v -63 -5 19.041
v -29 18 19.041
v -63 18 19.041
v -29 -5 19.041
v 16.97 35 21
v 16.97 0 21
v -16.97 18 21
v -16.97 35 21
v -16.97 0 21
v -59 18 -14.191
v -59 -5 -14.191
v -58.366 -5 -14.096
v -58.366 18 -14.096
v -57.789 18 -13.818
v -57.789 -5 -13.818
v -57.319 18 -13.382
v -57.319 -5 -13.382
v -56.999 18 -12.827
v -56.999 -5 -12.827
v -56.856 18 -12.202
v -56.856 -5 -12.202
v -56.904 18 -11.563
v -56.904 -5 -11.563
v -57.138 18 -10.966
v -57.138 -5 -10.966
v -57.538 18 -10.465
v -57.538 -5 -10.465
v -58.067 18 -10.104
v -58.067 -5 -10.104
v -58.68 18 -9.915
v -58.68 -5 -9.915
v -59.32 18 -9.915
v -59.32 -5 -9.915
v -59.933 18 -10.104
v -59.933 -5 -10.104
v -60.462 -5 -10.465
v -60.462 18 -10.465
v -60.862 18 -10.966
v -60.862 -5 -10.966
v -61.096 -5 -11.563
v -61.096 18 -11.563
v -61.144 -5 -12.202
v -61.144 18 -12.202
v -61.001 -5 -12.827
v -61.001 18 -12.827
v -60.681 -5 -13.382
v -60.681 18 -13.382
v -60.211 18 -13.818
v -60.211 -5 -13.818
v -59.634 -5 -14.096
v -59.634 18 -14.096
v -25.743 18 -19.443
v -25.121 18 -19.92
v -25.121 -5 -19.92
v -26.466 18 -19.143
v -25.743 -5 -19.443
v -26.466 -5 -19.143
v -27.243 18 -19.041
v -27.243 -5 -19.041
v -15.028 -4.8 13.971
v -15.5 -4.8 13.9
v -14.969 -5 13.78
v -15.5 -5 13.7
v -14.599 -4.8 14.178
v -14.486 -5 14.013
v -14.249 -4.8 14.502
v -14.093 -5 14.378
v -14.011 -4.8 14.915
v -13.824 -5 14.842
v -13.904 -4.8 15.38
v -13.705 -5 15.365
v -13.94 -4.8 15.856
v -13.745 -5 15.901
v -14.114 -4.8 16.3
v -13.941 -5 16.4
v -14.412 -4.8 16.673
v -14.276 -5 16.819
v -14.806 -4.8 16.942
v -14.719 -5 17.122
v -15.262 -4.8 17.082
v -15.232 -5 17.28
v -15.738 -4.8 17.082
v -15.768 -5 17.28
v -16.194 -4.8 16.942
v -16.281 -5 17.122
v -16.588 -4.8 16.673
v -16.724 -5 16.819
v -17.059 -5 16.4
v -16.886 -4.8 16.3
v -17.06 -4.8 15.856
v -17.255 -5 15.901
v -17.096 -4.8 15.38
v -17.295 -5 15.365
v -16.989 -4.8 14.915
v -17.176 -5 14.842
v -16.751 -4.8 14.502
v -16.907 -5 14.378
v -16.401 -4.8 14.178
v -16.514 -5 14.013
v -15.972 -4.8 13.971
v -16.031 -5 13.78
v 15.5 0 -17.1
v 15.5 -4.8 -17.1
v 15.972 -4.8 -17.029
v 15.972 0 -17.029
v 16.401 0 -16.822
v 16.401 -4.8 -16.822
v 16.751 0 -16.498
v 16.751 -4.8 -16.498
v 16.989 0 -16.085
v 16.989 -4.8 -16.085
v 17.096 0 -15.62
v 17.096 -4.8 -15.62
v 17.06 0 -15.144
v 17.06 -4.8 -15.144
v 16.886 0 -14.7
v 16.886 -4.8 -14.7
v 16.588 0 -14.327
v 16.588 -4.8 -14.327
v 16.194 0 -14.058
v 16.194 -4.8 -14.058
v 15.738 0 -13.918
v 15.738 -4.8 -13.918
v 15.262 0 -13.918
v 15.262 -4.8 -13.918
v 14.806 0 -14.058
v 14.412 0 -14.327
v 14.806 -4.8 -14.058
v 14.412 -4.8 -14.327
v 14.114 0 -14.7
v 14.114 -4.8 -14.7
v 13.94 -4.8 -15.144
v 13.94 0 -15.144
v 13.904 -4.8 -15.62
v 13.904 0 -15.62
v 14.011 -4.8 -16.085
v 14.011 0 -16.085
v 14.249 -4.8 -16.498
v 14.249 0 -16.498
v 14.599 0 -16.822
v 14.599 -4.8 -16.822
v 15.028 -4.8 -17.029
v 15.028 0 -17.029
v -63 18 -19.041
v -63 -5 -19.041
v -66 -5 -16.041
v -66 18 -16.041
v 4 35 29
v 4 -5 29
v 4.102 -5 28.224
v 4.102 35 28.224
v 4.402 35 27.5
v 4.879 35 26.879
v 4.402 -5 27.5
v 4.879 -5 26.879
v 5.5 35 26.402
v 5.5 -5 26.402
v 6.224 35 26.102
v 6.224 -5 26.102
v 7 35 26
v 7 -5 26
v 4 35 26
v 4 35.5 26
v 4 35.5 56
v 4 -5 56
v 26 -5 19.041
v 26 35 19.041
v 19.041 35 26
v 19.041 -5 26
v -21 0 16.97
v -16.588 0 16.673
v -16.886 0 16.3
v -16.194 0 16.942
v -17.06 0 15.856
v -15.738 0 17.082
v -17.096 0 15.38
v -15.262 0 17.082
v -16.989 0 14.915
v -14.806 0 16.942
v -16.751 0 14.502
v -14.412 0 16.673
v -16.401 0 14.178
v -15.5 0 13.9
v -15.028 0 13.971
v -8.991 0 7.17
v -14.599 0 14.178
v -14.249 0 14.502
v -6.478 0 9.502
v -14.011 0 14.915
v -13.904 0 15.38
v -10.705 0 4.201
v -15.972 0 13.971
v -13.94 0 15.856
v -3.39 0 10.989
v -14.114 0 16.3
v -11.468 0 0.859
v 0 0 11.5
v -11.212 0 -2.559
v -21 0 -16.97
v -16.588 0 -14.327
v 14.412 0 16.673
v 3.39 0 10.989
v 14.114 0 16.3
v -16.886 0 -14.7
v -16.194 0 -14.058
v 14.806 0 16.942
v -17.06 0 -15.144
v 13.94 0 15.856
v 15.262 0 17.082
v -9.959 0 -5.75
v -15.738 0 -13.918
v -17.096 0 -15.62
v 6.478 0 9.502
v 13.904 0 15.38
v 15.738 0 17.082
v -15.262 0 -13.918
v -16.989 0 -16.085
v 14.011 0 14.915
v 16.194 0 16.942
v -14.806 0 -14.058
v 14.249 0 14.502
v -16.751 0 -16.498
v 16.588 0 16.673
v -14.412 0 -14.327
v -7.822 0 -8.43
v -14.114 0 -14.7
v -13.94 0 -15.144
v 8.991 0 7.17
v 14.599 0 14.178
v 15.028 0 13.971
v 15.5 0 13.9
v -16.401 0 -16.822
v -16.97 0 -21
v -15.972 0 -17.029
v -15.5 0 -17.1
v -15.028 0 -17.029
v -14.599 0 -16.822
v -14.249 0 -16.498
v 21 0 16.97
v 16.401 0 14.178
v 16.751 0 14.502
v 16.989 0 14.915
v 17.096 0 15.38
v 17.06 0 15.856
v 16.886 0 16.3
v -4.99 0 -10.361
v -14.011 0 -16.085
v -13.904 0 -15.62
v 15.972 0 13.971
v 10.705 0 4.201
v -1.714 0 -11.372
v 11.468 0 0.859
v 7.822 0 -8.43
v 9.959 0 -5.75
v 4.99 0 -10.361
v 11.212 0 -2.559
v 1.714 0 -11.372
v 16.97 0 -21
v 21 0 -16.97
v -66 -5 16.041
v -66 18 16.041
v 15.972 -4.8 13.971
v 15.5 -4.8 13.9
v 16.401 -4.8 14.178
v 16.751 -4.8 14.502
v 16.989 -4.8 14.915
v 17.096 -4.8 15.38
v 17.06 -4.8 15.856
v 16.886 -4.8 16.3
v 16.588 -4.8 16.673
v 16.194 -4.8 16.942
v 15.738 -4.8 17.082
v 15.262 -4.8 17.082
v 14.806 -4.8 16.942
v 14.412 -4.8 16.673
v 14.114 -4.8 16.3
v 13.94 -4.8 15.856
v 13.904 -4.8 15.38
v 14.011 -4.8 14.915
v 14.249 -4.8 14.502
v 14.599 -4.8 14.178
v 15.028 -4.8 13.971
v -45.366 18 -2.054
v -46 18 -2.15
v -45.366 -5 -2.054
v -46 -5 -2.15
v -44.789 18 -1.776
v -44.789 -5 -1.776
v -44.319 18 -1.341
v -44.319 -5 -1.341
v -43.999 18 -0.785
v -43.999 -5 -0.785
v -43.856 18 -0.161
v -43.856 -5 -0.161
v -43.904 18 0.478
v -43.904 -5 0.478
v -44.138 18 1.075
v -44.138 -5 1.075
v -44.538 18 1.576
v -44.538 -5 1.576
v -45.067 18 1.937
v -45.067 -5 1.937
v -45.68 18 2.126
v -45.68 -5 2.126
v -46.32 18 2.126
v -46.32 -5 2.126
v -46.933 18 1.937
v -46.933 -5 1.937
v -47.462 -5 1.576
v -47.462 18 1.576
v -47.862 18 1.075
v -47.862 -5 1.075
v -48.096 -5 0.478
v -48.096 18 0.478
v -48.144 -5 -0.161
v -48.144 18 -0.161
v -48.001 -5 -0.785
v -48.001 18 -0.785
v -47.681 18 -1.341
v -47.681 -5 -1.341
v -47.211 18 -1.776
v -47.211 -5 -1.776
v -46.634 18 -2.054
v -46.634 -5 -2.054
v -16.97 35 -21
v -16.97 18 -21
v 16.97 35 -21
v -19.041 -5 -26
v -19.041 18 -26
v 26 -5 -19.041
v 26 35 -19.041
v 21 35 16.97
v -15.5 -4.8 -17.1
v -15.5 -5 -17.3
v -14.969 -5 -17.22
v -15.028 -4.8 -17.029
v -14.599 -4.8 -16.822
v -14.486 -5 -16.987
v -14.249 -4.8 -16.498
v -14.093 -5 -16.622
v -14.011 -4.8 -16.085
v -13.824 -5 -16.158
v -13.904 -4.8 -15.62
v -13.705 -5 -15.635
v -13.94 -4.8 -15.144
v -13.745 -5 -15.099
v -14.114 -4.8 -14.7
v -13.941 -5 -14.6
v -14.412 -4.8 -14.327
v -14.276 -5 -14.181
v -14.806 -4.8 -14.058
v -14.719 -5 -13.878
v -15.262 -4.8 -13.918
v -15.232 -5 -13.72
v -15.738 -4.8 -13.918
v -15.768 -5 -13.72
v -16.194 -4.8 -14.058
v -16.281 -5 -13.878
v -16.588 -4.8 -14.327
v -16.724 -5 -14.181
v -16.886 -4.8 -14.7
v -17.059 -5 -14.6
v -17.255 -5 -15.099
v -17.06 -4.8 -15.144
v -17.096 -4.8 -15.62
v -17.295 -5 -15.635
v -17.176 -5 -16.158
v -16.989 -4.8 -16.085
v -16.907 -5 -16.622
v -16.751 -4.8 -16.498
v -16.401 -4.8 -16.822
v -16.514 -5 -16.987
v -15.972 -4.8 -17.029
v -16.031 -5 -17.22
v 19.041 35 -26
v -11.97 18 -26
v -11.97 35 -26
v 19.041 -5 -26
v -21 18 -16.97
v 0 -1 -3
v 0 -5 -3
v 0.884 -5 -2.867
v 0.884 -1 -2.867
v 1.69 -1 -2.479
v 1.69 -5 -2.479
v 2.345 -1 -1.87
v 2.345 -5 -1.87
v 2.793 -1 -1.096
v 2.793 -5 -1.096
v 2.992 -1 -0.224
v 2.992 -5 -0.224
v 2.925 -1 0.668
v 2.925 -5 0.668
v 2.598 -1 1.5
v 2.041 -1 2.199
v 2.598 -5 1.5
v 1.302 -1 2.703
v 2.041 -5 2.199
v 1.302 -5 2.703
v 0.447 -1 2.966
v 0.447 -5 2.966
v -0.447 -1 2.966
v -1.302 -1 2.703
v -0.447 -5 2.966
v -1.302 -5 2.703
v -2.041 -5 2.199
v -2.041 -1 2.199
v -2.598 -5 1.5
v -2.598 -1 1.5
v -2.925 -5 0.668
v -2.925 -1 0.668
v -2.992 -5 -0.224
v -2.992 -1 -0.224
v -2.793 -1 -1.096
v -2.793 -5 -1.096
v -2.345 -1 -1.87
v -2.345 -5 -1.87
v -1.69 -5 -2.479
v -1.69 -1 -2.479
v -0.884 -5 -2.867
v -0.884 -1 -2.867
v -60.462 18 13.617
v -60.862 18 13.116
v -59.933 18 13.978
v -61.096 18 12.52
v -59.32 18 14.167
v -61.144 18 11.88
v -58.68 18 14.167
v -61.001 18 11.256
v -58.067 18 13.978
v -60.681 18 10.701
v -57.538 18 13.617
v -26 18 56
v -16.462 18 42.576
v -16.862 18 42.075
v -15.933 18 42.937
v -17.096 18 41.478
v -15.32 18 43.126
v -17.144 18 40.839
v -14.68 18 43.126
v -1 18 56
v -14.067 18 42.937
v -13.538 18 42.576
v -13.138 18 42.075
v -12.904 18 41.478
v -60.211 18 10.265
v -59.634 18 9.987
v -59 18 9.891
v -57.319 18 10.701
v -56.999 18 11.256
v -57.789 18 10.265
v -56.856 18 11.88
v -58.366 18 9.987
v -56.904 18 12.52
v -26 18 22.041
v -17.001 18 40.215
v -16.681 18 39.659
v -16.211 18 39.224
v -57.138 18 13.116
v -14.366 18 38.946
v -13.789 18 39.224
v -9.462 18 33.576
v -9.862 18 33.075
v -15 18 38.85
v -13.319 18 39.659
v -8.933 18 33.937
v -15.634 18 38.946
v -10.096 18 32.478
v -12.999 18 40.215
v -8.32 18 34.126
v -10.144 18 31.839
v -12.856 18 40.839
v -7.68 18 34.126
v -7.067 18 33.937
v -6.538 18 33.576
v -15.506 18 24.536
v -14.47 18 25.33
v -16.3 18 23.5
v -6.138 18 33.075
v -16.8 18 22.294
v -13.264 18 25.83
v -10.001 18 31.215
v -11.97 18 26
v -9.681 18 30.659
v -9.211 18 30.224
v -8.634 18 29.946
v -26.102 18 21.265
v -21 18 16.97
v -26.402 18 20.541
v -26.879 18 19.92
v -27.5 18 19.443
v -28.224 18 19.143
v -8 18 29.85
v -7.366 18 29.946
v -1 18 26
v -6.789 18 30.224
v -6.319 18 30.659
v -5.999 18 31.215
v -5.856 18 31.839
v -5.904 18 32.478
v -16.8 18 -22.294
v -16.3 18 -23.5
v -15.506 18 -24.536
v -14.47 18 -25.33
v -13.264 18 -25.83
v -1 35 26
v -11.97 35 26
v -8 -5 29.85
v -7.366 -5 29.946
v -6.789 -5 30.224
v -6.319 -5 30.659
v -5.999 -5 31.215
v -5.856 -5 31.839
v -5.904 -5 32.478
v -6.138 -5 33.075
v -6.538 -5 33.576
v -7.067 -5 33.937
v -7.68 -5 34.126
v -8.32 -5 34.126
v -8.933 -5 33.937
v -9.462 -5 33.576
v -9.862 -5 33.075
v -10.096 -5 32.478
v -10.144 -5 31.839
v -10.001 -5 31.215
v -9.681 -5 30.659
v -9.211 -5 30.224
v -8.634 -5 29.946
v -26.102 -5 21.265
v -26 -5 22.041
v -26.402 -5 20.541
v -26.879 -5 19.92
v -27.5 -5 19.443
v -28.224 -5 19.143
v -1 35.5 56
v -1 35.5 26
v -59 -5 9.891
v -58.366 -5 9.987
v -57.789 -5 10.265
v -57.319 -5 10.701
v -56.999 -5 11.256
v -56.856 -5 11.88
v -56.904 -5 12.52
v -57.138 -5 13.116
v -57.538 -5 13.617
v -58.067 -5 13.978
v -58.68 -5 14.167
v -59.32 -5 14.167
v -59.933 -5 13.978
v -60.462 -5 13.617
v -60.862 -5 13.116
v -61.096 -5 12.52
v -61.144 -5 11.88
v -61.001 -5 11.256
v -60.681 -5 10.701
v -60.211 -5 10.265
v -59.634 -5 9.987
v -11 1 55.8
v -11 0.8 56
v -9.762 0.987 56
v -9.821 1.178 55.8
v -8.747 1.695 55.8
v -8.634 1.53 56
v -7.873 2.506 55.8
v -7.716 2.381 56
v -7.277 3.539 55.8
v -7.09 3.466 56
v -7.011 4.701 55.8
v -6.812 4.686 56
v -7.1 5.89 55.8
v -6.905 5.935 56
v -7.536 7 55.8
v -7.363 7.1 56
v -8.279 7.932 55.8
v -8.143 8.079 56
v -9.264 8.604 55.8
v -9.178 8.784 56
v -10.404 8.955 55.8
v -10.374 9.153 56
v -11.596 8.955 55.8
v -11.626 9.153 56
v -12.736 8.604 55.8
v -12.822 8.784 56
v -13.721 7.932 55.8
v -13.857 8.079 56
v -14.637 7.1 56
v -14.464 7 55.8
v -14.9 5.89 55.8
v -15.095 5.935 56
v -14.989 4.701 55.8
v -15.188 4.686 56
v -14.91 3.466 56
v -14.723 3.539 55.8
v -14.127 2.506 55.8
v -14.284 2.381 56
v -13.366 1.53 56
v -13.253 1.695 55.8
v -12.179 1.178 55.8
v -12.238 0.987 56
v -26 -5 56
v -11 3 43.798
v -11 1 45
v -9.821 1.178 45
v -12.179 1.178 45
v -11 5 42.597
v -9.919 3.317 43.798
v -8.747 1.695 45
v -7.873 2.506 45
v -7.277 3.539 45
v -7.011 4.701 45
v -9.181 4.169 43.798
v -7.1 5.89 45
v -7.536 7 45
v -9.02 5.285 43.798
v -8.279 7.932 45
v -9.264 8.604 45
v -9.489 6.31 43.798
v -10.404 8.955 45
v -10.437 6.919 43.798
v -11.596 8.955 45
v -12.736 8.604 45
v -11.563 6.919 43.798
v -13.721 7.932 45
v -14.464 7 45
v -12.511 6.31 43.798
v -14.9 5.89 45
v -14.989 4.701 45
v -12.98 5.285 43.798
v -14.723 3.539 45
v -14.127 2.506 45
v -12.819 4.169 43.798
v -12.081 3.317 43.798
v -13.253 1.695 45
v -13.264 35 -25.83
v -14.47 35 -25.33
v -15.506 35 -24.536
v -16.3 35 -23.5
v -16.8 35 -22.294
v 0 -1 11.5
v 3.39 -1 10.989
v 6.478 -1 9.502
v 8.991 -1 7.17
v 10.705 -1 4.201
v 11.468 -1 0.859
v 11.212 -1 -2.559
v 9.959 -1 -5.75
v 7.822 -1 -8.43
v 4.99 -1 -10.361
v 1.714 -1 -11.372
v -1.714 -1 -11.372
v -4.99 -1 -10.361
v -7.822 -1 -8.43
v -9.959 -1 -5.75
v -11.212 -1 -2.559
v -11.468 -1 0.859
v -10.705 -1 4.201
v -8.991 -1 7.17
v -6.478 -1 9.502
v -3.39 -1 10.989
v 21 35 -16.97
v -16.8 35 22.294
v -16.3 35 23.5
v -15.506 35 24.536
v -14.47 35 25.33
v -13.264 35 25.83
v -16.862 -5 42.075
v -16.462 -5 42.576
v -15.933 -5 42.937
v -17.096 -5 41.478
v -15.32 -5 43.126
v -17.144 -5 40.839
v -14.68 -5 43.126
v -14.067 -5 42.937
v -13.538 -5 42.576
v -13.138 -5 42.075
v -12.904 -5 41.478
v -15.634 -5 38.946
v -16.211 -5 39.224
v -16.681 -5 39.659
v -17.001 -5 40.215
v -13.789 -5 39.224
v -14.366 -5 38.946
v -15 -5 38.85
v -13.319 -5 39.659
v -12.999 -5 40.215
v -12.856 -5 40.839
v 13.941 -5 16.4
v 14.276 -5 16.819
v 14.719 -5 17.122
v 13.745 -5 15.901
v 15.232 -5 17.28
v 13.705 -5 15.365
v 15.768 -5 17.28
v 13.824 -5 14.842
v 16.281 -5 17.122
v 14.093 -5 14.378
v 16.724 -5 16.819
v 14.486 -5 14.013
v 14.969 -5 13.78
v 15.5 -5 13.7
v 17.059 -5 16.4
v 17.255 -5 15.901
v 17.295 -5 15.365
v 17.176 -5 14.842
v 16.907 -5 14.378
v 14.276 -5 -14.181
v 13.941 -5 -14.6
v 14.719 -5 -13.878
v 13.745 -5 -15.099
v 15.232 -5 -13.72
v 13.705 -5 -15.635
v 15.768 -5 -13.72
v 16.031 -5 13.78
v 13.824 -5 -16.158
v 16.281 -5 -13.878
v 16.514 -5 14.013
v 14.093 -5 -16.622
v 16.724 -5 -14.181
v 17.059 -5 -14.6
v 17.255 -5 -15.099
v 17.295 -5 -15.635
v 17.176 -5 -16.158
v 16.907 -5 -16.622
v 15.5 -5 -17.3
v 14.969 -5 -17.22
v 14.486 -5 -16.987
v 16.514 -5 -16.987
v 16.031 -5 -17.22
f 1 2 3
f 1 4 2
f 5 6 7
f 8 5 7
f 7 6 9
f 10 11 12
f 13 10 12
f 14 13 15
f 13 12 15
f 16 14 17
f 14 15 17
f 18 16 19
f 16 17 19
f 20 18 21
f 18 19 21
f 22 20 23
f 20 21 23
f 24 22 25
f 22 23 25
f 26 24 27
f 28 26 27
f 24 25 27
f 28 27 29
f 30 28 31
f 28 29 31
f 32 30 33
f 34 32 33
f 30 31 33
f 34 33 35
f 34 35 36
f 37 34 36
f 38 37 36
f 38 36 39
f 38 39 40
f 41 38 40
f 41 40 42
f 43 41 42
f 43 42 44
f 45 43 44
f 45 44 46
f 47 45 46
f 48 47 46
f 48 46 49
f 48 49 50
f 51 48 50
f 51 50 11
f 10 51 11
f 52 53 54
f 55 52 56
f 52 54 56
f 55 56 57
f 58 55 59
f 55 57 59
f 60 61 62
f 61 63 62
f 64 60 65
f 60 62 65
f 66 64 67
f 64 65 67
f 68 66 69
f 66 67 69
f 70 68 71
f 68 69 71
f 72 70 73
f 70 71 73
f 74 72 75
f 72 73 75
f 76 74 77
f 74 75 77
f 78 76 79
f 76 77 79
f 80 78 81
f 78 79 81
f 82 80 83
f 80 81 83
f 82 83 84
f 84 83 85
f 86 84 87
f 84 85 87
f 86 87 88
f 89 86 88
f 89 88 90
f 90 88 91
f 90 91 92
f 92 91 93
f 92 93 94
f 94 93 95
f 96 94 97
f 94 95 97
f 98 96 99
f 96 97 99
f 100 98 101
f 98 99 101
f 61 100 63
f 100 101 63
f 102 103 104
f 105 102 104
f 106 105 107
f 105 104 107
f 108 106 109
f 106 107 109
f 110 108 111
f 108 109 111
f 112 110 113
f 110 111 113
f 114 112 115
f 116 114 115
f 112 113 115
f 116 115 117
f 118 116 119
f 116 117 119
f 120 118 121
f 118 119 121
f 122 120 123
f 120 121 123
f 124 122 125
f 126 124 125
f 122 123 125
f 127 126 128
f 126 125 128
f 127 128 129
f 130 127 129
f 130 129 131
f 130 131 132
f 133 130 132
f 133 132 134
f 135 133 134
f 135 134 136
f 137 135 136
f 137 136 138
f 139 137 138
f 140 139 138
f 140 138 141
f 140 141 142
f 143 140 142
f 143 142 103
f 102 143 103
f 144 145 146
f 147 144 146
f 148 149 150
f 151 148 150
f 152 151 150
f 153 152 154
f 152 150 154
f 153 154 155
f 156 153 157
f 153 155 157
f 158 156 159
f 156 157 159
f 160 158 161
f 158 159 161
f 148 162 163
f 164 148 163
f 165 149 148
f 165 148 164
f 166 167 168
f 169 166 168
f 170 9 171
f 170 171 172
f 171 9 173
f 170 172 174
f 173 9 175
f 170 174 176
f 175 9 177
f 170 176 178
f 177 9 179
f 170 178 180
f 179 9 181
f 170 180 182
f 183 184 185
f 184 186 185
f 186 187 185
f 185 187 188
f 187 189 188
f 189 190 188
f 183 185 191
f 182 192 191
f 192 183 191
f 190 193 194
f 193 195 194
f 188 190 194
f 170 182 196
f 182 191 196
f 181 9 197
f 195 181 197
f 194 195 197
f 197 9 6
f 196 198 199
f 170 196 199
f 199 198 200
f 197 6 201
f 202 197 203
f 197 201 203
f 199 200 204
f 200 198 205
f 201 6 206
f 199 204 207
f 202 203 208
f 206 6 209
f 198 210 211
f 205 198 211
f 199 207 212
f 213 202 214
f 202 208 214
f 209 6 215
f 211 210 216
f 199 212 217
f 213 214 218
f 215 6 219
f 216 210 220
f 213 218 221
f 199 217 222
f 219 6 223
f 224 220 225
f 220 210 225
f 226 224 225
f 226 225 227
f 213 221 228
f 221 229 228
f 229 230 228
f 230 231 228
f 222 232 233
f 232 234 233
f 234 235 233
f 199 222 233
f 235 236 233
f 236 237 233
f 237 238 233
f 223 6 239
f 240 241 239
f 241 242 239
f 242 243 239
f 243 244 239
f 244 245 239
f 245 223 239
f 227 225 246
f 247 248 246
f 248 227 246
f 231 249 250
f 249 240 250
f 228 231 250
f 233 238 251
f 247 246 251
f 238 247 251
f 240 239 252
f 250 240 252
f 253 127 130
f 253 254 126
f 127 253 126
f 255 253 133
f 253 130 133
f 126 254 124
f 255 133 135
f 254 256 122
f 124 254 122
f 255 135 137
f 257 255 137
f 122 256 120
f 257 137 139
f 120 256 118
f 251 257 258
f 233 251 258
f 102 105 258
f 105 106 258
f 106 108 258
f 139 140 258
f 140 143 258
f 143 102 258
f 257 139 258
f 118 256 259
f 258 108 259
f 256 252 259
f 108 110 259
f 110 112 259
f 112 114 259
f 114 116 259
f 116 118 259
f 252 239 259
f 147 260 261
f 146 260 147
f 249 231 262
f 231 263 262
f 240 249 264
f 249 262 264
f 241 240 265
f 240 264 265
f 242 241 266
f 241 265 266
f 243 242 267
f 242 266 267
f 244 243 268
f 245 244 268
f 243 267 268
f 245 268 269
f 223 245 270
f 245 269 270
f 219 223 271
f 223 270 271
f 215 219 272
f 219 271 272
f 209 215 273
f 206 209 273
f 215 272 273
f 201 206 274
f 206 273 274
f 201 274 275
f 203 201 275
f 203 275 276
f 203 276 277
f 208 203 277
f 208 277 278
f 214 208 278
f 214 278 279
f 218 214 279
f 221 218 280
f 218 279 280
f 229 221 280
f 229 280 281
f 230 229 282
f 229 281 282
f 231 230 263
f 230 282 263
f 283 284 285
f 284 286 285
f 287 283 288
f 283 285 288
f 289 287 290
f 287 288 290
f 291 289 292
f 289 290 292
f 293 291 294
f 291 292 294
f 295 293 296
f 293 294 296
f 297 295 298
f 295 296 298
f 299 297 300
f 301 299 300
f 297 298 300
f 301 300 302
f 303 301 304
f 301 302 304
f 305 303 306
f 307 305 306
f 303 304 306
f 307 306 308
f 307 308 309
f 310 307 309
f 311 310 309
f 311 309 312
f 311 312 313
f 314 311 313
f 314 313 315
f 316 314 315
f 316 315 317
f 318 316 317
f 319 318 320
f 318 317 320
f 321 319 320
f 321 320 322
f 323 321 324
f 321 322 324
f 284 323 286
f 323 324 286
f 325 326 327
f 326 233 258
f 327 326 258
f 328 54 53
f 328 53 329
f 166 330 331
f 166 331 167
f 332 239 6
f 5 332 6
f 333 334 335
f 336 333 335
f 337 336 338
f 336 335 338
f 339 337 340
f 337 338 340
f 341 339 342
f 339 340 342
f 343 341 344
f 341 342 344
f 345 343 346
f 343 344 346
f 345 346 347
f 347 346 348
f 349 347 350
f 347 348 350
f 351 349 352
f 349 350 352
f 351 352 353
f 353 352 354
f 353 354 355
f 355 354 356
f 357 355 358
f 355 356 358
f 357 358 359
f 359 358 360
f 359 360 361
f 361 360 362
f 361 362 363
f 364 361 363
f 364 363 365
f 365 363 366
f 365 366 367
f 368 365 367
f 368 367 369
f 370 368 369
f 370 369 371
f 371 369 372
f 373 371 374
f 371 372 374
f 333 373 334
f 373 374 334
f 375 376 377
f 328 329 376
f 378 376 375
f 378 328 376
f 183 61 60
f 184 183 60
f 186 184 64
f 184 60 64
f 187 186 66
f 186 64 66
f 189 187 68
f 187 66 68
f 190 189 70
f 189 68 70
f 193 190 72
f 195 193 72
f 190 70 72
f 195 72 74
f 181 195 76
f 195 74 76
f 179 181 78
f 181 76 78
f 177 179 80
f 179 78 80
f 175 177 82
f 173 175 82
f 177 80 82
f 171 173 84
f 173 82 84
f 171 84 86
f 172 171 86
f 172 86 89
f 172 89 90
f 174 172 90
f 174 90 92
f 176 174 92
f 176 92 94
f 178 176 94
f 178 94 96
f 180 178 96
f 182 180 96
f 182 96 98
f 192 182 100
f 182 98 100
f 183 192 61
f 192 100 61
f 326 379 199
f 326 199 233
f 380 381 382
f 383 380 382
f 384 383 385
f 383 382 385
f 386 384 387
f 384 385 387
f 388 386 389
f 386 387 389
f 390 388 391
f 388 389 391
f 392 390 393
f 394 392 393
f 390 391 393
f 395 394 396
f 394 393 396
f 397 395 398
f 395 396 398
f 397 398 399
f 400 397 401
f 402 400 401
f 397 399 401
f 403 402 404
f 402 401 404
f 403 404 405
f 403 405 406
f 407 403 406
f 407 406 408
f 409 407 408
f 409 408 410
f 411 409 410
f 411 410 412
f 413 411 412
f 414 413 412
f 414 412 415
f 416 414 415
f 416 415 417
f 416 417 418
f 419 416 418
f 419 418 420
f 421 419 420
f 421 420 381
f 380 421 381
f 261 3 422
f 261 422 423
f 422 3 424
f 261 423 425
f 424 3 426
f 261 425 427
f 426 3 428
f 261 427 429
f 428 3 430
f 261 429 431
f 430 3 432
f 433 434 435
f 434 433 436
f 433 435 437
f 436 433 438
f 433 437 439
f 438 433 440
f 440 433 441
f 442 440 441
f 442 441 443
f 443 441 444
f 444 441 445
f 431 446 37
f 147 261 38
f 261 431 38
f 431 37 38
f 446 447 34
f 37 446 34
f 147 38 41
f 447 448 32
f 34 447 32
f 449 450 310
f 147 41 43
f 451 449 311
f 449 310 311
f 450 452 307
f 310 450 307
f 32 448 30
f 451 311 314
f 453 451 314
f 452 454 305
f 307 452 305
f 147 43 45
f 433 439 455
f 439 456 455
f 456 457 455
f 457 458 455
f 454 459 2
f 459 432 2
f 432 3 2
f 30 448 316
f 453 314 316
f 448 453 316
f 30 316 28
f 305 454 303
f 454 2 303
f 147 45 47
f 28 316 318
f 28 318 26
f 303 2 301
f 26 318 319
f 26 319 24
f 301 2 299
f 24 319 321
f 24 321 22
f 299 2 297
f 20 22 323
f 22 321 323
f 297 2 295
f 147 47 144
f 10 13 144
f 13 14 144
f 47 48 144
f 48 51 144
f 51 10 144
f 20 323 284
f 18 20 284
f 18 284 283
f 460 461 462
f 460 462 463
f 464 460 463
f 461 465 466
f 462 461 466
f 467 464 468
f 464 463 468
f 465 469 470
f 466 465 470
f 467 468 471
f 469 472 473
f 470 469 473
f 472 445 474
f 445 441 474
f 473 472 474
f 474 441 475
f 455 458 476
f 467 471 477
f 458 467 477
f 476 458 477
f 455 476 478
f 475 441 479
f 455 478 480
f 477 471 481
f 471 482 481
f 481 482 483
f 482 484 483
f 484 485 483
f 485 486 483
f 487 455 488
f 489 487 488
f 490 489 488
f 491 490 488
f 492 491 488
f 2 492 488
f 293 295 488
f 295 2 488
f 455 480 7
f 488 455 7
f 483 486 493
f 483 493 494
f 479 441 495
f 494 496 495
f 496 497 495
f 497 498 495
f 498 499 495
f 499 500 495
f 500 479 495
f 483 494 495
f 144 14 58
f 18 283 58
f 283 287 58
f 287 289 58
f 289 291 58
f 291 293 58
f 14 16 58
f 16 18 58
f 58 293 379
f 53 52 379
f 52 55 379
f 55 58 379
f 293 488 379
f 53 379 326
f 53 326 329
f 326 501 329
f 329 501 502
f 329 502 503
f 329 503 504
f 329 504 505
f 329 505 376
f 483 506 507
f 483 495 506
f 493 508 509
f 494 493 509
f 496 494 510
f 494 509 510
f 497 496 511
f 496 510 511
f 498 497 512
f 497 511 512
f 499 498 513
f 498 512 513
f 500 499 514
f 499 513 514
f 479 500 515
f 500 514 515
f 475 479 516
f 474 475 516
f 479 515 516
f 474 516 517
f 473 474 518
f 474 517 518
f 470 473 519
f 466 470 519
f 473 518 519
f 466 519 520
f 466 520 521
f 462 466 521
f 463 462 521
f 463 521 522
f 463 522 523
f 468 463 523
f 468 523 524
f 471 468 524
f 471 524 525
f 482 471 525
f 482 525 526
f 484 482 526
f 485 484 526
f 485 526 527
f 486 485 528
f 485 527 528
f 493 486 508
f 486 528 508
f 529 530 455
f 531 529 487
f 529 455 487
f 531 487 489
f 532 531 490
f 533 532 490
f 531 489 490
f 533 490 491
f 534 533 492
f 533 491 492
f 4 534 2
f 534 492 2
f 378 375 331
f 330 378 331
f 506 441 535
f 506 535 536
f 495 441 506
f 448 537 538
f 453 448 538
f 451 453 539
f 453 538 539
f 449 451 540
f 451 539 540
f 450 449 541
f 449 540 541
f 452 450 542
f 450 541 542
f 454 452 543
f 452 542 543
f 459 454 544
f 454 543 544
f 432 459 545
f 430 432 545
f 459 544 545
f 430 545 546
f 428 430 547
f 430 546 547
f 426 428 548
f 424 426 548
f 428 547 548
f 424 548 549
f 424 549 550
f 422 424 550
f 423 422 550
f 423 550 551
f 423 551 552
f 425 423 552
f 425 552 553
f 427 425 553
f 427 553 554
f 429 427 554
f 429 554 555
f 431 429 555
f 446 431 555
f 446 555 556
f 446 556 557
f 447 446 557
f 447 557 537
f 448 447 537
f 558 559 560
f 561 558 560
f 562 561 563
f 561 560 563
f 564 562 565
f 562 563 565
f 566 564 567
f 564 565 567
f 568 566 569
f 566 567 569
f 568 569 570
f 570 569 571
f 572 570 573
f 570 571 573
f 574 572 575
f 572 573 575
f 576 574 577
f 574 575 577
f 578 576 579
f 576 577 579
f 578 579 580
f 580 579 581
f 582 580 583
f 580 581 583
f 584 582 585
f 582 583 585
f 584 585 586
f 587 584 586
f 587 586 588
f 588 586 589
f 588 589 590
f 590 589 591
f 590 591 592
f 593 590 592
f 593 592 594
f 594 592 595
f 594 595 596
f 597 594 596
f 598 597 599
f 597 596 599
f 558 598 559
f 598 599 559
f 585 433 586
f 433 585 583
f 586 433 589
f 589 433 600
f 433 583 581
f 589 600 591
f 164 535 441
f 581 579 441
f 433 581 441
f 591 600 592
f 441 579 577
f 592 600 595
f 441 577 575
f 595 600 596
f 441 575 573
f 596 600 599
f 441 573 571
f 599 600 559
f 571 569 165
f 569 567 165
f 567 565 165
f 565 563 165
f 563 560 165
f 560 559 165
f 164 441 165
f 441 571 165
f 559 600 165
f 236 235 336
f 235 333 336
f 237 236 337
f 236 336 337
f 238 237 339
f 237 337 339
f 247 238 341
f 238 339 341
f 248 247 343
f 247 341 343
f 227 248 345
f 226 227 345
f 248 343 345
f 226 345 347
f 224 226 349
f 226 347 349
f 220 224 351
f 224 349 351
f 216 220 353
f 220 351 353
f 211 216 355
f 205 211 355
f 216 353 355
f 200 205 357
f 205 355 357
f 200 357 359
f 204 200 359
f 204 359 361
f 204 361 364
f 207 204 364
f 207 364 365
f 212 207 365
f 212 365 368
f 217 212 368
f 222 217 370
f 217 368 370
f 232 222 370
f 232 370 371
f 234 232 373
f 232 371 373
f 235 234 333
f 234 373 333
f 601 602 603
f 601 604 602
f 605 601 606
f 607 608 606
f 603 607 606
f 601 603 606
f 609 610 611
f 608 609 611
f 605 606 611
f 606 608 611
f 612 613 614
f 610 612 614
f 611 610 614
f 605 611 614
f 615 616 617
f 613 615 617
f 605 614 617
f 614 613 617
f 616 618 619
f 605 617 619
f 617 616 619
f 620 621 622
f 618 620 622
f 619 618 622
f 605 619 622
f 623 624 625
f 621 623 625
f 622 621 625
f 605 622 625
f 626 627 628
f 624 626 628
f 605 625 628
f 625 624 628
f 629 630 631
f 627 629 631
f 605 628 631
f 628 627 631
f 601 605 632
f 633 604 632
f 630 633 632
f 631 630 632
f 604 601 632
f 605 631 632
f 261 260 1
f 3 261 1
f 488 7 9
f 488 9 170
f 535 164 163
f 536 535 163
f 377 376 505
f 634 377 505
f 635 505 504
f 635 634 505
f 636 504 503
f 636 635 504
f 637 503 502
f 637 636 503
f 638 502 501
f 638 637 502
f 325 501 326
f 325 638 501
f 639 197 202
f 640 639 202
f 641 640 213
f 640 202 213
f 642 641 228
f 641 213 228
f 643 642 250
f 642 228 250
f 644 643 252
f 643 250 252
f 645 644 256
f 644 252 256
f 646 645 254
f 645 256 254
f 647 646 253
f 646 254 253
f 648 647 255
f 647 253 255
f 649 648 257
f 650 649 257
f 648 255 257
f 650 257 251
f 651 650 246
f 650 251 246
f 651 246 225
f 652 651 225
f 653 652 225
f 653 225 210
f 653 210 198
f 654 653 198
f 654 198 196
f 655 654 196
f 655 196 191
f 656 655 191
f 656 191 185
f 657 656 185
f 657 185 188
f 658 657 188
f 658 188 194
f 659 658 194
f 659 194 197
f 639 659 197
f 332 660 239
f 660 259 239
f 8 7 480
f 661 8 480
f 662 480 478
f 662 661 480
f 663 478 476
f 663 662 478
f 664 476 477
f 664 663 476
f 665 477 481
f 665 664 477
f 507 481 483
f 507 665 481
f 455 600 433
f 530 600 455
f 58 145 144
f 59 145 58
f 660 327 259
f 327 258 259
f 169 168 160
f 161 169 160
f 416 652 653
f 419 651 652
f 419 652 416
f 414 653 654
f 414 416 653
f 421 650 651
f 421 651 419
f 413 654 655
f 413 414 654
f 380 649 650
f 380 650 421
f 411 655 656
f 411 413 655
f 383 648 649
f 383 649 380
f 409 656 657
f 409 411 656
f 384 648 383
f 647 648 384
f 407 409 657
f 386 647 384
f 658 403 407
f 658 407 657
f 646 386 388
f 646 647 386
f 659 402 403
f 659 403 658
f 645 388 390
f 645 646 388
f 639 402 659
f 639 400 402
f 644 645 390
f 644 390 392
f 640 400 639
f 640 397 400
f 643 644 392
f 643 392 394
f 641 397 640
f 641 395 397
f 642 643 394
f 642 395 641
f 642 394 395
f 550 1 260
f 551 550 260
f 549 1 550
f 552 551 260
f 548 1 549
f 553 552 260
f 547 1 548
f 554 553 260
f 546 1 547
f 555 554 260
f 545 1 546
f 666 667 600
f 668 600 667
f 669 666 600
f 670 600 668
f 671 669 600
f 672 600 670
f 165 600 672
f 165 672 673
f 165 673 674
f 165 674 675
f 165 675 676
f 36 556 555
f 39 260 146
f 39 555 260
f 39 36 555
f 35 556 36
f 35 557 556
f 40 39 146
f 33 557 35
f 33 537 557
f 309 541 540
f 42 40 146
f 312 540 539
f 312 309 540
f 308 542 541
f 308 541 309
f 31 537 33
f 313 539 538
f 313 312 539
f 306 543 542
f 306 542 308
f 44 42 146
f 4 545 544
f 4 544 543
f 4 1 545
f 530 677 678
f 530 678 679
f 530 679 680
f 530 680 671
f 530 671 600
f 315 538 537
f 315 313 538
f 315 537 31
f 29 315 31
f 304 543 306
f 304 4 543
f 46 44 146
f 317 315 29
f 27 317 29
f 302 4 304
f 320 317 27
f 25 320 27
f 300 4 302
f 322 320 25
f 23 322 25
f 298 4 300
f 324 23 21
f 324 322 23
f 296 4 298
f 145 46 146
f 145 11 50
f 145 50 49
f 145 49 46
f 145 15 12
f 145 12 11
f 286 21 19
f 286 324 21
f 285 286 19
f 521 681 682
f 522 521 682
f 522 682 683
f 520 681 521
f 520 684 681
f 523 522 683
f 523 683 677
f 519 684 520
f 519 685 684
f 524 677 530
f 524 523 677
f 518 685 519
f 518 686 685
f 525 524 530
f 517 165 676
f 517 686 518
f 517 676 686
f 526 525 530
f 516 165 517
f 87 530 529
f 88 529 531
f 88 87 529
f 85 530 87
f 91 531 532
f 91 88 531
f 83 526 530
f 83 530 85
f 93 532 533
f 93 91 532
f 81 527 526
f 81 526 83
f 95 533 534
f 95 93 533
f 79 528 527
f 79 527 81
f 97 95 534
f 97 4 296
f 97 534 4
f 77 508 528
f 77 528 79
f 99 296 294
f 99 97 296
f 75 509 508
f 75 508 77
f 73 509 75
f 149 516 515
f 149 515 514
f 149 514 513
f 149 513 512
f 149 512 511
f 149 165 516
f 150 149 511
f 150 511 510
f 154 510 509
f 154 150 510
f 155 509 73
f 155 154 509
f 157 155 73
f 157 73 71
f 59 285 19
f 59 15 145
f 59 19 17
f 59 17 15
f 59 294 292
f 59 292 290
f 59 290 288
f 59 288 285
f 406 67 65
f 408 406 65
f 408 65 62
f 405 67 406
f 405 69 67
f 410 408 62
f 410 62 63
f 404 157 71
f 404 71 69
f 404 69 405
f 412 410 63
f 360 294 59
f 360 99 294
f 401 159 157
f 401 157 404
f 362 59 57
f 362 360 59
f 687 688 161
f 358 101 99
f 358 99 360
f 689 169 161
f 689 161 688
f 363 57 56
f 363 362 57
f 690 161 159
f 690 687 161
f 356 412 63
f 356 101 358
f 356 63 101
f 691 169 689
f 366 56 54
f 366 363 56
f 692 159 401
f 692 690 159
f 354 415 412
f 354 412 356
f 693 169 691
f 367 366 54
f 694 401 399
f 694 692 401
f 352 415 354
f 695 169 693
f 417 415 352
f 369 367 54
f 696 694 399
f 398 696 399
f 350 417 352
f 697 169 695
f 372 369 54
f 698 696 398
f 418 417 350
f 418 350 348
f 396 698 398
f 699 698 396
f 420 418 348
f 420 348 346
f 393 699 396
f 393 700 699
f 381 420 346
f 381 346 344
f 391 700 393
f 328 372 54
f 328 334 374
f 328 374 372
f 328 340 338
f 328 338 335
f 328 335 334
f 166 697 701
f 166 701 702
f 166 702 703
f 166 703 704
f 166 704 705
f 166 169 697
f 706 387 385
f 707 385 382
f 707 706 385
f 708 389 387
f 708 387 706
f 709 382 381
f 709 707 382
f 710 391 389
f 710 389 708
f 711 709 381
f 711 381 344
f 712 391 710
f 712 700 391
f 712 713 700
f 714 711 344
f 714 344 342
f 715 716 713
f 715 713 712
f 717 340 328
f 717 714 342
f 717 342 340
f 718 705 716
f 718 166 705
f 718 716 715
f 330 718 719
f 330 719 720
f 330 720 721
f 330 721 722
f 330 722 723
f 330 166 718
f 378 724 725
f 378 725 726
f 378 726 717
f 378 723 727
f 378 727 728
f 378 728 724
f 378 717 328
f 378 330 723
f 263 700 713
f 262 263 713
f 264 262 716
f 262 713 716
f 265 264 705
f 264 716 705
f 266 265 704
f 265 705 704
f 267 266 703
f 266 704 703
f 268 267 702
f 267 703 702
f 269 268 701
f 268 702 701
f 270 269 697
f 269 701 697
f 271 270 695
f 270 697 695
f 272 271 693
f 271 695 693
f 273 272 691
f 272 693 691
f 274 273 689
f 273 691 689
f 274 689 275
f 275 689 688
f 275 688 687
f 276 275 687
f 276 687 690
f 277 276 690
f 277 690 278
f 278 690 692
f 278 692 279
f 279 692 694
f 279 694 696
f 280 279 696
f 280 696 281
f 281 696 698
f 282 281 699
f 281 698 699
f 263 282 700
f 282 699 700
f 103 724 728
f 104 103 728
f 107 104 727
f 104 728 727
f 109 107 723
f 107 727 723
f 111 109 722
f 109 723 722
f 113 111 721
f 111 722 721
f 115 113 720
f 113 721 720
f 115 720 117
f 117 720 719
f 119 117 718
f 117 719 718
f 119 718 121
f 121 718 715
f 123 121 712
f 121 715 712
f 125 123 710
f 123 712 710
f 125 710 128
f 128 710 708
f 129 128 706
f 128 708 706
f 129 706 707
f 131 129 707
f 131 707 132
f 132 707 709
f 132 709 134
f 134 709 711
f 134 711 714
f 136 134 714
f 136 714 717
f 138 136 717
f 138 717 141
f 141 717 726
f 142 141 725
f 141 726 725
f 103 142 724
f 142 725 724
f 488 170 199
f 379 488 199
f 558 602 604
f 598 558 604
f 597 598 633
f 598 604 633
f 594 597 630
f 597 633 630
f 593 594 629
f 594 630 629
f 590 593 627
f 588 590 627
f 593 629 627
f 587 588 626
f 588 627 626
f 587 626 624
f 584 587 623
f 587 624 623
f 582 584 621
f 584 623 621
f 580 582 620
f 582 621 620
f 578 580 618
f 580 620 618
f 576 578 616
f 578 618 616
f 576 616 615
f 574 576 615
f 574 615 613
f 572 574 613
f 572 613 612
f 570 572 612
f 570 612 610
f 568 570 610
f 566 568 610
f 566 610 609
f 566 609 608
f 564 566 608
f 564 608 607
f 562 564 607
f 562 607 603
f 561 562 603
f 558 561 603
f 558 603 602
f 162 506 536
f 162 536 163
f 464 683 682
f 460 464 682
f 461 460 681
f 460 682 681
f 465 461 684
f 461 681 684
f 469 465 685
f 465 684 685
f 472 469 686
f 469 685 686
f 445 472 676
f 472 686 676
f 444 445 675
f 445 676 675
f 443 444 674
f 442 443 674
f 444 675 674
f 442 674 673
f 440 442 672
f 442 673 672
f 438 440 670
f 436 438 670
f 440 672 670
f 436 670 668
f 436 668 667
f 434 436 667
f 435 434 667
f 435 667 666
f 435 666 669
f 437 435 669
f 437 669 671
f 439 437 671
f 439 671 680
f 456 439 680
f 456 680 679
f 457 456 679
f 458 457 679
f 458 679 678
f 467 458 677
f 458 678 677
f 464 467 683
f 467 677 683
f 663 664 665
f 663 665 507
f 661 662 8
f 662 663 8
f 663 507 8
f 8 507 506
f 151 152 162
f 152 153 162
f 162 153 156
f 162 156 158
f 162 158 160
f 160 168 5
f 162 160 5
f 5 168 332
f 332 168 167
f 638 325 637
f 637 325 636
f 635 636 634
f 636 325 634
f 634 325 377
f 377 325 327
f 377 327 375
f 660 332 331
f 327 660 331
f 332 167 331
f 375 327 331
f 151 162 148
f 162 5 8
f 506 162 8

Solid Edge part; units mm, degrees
sketch "Sketch1" plane through (0, 0, 0) normal (0, -1, 0) x (1, 0, 0)
  line L0 (21, 16.97) -> (16.97, 21)
  line L1 (16.97, 21) -> (-16.97, 21)
  line L2 (-16.97, 21) -> (-21, 16.97)
  line L3 (-21, 16.97) -> (-21, -16.97)
  line L4 (-21, -16.97) -> (-16.97, -21)
  line L5 (-16.97, -21) -> (16.97, -21)
  line L6 (16.97, -21) -> (21, -16.97)
  line L7 (21, -16.97) -> (21, 16.97)
  line L8 (26, 19.0411) -> (19.0411, 26)
  line L9 (19.0411, 26) -> (-19.0411, 26)
  line L10 (-19.0411, 26) -> (-26, 19.0411)
  line L11 (-26, 19.0411) -> (-26, -19.0411)
  line L12 (-26, -19.0411) -> (-19.0411, -26)
  line L13 (-19.0411, -26) -> (19.0411, -26)
  line L14 (19.0411, -26) -> (26, -19.0411)
  line L15 (26, -19.0411) -> (26, 19.0411)
  dimension "D1" = 33.94
  dimension "D2" = 33.94
  dimension "D3" = 33.94
  dimension "D4" = 33.94
  dimension "D5" = 42
  dimension "D6" = 42
  dimension "D7" = 21
  dimension "D8" = 5
extrude "Protrusion1" add sketch "Sketch1" against normal blind 35
sketch "Sketch2" plane through (0, 0, 0) normal (0, -1, 0) x (1, 0, 0)
  line L0 (19.0411, 26) -> (-19.0411, 26)
  line L1 (-19.0411, 26) -> (-26, 19.0411)
  line L2 (-26, 19.0411) -> (-26, -19.0411)
  line L3 (-26, -19.0411) -> (-19.0411, -26)
  line L4 (-19.0411, -26) -> (19.0411, -26)
  line L5 (19.0411, -26) -> (26, -19.0411)
  line L6 (26, -19.0411) -> (26, 19.0411)
  line L7 (26, 19.0411) -> (19.0411, 26)
extrude "Deckel" add sketch "Sketch2" along normal blind 5
hole "Motorwelle" at (0, -5, 0) direction (0, 1, 0) diameter 6 end up to next
hole "Hole1" at (-15.5, -5, -15.5) direction (0, 1, 0) diameter 3.2 end up to next start chamfer 0.2 start chamfer angle 45
hole "Hole2" at (-15.5, -5, 15.5) direction (0, 1, 0) diameter 3.2 end up to next start chamfer 0.2 start chamfer angle 45
hole "Hole3" at (15.5, -5, 15.5) direction (0, 1, 0) diameter 3.2 end up to next start chamfer 0.2 start chamfer angle 45
hole "Hole4" at (15.5, -5, -15.5) direction (0, 1, 0) diameter 3.2 end up to next start chamfer 0.2 start chamfer angle 45
sketch "Sketch3" plane through (0, 0, 0) normal (0, 1, 0) x (0, 0, 1)
  circle A0 centre (0, 0) radius 11.5
  dimension "D1" = 23
extrude "Motoflansch" cut sketch "Sketch3" against normal blind 1
sketch "Sketch4" plane through (0, -5, 0) normal (0, -1, 0) x (1, 0, 0)
  line L0 (-26, 19.0411) -> (-19.0411, 26)
  line L1 (-19.0411, 26) -> (4, 26)
  line L2 (4, 26) -> (4, 56)
  line L3 (-26, 56) -> (4, 56)
  line L4 (-26, 19.0411) -> (-26, 56)
  dimension "D1" = 30
  dimension "D2" = 30
extrude "Motoraufhängung_Leiste" add sketch "Sketch4" against normal blind 23
sketch "Sketch5" plane through (-13, 18, 33.5205) normal (0, 1, 0) x (-1, 0, 0)
  line L0 (-17, -7.5205) -> (-17, 22.4795)
  line L1 (-17, 22.4795) -> (-12, 22.4795)
  line L2 (-12, 22.4795) -> (-12, -7.5205)
  line L3 (-12, -7.5205) -> (-17, -7.5205)
  dimension "D1" = 5
extrude "Zentrierung_Leiste" add sketch "Sketch5" along normal blind 17.5
sketch "Sketch6" plane through (0, -5, 11) normal (0, -1, 0) x (1, 0, 0)
  line L0 (-26, -30.0411) -> (-26, 8.0411)
  line L1 (-26, 8.0411) -> (-63, 8.0411)
  line L2 (-66, 5.0411) -> (-63, 8.0411)
  line L3 (-66, 5.0411) -> (-66, -27.0411)
  line L4 (-63, -30.0411) -> (-66, -27.0411)
  line L5 (-63, -30.0411) -> (-26, -30.0411)
  dimension "D1" = 3
  dimension "D2" = 3
  dimension "D3" = 40
extrude "Auflage_auf_Platte" add sketch "Sketch6" against normal blind 23
hole "Bohrung_Alustange" at (-11, 5, 56) direction (0, 0, -1) diameter 8 depth 11 tip angle 118 start chamfer 0.2 start chamfer angle 45
sketch "Sketch7" plane through (0, 35, 0) normal (0, 1, 0) x (1, 0, 0)
  line L0 (-19.0411, 26) -> (-16.97, 21)
  line L1 (-16.97, 21) -> (-16.97, -21)
  line L2 (-16.97, -21) -> (-19.0411, -26)
  line L3 (-19.0411, -26) -> (-26, -26)
  line L4 (-26, -26) -> (-26, 26)
  line L5 (-26, 26) -> (-19.0411, 26)
extrude "Motorseite" cut sketch "Sketch7" against normal blind 17
hole "Hole5" at (-8, -5, 32) direction (0, 1, 0) diameter 4.3 end up to next
hole "Hole6" at (-15, -5, 41) direction (0, 1, 0) diameter 4.3 end up to next
hole "Hole7" at (-59, -5, 12.0411) direction (0, 1, 0) diameter 4.3 end up to next
hole "Hole8" at (-59, -5, -12.0411) direction (0, 1, 0) diameter 4.3 end up to next
hole "Hole9" at (-46, -5, 0) direction (0, 1, 0) diameter 4.3 end up to next
fillet "Verrundung_Innen" radius 3 3 edges at (-26, 6.5, -19.0411) (-26, 6.5, 19.0411) (4, 15, 26)
fillet "Verrundung_spitzeEcke" radius 5 2 edges at (-19.0411, 26.5, 26) (-19.0411, 26.5, -26)
